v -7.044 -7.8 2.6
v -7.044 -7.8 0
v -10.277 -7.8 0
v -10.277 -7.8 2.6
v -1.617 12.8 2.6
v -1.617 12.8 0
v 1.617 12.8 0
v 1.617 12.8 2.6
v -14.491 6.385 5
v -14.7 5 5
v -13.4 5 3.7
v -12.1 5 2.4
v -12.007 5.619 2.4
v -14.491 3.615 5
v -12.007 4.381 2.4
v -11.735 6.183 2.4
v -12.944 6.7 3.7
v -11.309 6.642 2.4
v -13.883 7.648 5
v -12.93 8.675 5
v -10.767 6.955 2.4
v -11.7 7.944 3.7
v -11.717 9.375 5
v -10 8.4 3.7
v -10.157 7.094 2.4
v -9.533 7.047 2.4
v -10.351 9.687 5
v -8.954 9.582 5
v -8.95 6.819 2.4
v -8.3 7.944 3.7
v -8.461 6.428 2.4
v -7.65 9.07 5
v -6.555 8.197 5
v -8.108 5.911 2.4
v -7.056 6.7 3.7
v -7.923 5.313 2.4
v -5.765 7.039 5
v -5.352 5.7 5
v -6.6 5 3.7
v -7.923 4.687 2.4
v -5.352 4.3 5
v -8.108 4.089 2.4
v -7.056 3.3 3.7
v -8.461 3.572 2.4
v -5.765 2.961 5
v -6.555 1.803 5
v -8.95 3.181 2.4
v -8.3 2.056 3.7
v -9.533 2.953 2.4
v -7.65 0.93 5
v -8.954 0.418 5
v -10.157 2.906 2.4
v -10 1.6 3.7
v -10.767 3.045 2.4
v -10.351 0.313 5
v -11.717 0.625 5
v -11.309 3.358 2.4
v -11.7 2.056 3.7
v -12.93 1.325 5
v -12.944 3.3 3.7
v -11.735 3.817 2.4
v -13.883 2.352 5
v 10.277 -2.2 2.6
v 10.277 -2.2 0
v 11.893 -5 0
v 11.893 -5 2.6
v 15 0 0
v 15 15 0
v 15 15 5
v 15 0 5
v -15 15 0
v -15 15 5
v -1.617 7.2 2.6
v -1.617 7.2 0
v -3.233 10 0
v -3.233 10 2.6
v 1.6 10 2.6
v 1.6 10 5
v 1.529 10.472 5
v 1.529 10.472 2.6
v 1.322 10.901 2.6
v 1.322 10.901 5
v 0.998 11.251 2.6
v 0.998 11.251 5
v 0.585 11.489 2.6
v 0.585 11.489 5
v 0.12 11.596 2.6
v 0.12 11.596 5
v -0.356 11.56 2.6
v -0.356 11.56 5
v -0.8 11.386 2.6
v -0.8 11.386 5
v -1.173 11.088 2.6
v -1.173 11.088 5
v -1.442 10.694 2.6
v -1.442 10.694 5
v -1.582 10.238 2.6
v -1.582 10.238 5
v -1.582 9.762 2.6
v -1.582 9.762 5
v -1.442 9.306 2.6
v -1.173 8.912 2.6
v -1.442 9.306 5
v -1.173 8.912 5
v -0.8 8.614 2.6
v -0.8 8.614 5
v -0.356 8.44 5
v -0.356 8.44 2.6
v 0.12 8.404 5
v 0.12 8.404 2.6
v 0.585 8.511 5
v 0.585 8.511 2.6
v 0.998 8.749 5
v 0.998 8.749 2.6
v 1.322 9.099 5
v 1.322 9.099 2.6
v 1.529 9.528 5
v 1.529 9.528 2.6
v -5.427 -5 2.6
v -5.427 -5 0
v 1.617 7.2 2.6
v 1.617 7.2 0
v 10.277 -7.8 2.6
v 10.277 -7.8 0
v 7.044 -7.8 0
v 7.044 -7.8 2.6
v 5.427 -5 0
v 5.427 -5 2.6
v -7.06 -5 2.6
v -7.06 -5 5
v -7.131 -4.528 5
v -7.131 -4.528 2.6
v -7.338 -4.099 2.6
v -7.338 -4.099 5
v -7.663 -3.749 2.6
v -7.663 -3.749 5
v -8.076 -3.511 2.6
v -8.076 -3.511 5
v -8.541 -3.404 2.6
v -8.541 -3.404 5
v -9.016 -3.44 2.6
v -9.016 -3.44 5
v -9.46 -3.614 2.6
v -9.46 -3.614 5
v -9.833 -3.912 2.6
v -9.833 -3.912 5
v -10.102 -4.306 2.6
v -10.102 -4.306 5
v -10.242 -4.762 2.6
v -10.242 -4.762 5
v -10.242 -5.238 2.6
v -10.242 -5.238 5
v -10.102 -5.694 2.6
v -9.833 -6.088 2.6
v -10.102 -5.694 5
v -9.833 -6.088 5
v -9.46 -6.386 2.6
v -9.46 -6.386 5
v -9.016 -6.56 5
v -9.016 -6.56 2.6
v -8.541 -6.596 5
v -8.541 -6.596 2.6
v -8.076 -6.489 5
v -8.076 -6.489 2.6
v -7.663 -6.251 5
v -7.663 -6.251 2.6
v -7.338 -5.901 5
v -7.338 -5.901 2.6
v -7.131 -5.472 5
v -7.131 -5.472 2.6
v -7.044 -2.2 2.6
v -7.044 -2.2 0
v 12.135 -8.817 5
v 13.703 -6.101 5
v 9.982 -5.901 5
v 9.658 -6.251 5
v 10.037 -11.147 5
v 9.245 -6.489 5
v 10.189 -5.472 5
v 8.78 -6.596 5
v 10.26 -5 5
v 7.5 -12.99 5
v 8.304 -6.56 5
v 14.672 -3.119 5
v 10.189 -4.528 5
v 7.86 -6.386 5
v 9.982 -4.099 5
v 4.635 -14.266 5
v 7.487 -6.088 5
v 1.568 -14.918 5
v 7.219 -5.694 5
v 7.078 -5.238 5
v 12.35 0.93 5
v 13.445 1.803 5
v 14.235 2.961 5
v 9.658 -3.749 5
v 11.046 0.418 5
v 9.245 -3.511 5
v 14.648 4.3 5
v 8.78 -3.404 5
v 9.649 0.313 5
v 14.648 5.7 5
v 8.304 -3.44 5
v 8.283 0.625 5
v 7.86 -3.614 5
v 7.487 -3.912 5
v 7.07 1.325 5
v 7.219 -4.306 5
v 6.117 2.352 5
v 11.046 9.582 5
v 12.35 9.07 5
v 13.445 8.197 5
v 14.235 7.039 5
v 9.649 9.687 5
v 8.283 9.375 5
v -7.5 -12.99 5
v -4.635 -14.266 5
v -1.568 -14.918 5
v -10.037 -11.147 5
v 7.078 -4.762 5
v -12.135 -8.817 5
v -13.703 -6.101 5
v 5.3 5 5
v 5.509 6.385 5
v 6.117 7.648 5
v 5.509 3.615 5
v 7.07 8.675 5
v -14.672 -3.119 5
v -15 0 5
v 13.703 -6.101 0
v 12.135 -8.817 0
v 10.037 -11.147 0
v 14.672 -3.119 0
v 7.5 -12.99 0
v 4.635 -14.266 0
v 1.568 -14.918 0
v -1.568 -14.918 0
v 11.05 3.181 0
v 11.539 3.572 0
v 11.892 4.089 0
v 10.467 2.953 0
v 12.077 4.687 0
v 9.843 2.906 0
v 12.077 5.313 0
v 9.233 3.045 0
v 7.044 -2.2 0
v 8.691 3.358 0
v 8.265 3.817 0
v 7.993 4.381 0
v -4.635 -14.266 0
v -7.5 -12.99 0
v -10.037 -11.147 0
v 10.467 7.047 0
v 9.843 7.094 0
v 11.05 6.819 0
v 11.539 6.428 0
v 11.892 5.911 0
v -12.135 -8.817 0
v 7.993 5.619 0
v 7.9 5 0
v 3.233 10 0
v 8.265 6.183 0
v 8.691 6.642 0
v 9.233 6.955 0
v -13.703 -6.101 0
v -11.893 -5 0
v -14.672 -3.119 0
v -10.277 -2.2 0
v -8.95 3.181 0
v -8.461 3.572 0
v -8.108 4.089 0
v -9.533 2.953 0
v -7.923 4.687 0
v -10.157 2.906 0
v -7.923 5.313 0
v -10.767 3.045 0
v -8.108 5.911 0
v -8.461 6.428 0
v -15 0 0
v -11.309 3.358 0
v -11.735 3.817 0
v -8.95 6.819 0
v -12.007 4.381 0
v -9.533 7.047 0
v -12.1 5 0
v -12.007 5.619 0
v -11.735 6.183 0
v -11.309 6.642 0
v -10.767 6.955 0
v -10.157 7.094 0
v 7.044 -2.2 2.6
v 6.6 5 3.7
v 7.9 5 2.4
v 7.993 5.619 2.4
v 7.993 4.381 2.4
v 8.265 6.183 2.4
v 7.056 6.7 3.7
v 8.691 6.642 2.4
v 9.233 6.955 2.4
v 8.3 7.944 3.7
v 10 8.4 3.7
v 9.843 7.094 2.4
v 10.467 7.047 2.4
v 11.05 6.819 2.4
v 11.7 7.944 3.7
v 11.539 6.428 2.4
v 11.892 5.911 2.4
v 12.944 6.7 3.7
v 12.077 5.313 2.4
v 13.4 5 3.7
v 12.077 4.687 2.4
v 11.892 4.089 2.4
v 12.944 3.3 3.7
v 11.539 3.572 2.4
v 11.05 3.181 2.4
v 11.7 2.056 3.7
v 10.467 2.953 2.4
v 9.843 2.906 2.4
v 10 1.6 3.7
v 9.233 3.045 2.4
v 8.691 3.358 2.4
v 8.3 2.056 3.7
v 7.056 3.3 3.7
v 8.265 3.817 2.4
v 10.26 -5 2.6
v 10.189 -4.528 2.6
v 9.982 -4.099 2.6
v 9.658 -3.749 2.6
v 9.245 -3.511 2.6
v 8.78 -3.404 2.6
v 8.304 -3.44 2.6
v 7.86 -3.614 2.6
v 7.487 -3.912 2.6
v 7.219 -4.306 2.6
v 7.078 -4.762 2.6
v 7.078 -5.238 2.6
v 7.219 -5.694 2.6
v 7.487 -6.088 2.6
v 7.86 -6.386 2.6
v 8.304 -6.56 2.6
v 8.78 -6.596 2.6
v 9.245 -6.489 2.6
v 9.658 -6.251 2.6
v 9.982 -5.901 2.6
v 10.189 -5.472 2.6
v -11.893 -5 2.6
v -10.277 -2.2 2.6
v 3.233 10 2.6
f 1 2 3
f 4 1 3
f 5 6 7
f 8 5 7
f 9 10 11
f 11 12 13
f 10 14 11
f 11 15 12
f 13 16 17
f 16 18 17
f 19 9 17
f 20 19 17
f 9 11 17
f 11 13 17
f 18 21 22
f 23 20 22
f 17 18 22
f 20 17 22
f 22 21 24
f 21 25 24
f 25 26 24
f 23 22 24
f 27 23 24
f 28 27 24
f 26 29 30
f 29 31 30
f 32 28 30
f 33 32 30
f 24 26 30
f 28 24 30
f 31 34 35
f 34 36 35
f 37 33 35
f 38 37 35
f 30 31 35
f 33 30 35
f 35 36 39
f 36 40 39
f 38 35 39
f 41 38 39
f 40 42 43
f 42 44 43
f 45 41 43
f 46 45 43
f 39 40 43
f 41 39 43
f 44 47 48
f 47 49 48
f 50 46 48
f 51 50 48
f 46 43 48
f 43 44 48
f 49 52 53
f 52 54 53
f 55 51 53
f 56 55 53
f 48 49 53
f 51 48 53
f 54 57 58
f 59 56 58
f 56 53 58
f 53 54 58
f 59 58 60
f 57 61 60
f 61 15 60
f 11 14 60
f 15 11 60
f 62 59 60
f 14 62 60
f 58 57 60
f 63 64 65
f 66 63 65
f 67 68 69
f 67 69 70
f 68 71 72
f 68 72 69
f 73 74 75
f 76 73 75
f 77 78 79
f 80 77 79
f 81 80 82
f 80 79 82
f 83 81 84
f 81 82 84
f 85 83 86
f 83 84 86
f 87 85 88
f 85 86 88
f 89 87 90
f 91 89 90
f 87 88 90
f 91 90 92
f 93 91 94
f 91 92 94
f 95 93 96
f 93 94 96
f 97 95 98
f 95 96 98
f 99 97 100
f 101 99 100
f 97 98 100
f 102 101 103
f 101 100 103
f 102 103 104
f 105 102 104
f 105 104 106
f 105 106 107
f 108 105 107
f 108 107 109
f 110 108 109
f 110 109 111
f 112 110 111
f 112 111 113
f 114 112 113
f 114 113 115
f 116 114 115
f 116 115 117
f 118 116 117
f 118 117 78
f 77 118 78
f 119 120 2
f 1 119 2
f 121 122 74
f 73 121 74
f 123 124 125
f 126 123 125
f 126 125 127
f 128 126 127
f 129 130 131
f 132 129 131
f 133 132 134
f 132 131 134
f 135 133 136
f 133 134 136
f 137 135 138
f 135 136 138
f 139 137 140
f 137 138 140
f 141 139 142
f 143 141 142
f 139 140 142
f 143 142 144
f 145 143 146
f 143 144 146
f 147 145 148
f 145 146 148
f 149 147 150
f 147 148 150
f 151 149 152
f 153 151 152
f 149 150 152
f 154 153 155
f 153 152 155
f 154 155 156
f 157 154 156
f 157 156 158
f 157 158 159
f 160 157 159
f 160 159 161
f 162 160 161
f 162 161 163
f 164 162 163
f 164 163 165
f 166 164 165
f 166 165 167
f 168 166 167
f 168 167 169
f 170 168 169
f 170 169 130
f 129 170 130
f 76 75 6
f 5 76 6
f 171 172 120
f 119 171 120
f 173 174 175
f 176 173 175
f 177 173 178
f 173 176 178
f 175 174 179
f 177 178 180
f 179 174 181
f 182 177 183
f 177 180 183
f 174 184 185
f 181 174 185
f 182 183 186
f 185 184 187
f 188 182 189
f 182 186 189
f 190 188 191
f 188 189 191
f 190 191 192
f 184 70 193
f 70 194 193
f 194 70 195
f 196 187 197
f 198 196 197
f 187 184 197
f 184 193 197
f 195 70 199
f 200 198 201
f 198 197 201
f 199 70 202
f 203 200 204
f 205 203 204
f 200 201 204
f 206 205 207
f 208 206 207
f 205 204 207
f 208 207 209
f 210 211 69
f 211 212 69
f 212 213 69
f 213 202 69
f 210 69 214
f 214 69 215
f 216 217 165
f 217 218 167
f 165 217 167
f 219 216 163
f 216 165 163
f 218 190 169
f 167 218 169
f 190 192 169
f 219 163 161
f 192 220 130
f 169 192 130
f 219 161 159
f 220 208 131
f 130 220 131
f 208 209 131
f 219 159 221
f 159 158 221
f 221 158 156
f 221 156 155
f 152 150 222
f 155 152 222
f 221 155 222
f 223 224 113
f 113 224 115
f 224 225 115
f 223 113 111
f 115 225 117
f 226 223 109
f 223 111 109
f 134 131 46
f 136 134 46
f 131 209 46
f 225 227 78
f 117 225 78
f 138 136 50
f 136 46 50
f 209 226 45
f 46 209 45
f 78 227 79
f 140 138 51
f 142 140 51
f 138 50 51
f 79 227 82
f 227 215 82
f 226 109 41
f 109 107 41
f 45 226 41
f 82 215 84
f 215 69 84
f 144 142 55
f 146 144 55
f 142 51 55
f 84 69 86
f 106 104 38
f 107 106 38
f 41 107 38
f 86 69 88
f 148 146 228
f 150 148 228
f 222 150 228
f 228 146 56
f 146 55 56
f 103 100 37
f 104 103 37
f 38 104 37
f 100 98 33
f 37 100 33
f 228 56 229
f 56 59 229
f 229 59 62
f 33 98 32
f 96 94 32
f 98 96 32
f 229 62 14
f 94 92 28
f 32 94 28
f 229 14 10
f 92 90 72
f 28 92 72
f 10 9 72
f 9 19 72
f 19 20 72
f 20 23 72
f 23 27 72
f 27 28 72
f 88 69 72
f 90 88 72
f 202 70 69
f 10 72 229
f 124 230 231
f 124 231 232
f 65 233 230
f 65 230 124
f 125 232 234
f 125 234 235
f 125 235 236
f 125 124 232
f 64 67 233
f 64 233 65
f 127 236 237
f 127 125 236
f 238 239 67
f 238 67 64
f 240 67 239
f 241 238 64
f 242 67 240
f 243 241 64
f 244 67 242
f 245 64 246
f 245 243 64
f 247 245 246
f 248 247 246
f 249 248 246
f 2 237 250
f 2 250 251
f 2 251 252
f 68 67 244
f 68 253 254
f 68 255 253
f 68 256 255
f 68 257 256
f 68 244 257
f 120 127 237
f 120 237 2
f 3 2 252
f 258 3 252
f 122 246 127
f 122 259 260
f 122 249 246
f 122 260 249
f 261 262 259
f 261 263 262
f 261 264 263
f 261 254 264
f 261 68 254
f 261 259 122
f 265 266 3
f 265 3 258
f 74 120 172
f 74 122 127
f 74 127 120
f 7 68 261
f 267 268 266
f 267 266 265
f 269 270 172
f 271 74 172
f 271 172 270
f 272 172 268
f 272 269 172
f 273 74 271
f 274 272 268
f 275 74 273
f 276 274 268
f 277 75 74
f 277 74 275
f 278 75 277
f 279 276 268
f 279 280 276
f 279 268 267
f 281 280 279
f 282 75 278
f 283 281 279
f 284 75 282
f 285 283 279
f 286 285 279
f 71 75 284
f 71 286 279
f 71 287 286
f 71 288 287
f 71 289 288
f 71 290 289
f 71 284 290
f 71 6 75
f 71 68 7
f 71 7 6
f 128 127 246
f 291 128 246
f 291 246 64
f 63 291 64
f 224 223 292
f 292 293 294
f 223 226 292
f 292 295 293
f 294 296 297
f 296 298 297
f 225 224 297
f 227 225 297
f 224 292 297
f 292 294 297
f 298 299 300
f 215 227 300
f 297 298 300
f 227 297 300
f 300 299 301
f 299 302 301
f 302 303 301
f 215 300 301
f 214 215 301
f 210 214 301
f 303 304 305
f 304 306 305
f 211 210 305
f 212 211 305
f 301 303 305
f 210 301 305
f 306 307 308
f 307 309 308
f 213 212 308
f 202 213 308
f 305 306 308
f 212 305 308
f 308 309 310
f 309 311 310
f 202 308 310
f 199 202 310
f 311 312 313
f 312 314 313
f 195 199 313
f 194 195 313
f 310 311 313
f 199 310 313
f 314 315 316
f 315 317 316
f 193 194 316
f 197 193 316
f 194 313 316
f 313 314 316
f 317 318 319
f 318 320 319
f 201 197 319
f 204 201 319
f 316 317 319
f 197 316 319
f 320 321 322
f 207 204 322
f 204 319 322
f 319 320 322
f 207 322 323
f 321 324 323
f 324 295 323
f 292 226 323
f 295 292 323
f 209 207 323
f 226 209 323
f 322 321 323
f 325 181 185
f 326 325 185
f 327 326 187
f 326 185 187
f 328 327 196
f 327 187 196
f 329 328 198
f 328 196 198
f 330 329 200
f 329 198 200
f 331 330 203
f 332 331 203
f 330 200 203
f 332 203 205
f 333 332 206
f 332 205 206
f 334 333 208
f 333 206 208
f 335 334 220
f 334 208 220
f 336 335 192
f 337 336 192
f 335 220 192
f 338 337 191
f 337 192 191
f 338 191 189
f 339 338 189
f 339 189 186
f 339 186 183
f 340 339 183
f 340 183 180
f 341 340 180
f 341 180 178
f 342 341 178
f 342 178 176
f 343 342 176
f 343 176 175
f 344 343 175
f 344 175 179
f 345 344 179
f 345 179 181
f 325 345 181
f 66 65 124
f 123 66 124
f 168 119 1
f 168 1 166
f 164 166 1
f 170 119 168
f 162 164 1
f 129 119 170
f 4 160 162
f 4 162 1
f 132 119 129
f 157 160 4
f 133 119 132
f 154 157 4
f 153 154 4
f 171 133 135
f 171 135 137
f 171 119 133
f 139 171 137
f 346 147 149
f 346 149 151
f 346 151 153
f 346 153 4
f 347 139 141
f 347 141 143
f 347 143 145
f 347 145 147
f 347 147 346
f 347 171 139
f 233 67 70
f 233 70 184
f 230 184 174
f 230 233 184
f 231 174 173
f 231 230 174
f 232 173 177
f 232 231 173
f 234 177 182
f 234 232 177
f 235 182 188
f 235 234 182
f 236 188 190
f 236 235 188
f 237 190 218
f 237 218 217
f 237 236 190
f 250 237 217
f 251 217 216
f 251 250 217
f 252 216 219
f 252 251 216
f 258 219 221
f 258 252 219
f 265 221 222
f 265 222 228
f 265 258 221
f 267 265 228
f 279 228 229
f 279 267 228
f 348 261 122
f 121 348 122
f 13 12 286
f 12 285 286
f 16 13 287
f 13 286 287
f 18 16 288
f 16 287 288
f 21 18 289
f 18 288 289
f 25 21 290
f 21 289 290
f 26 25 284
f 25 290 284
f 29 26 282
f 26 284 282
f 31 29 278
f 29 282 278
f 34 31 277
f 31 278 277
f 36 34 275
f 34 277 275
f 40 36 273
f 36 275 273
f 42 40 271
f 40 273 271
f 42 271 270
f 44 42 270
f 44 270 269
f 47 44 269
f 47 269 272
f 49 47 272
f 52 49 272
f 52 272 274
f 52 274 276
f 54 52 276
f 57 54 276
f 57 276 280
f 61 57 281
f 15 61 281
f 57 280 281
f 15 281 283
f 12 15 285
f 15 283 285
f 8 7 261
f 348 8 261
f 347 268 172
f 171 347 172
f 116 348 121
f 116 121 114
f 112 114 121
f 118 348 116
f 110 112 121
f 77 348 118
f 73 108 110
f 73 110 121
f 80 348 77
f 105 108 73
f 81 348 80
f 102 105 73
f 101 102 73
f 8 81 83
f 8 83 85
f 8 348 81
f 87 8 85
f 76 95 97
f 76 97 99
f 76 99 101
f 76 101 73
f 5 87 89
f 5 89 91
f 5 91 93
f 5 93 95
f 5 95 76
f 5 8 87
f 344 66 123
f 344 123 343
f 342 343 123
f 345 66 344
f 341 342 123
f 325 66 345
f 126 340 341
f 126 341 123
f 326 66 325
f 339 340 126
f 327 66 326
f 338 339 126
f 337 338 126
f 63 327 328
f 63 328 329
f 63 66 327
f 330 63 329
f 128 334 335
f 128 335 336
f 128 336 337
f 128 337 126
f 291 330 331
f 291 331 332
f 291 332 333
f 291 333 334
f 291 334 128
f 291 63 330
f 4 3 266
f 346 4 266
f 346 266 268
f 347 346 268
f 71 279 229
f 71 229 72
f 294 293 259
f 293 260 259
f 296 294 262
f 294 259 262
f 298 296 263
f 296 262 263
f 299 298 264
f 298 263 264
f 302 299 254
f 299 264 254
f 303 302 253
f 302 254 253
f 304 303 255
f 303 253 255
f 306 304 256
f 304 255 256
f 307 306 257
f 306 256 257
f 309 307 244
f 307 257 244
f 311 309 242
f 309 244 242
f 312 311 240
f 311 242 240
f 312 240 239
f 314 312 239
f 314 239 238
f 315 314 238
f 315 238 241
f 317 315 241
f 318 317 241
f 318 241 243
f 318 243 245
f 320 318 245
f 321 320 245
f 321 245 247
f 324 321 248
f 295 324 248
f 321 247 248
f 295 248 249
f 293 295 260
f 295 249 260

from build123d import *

# Parameters (mm, degrees)
EXTRUDE_1_DEPTH             = 5
SKETCH_2_R                  = 1.6
CUT_EXTRUDE_1_DEPTH         = 22.794494718
HOLE_WIZARD_M41_D           = 4.2
HOLE_WIZARD_M41_DEPTH       = 8.5
HOLE_WIZARD_M41_CSINK_D     = 9.4
HOLE_WIZARD_M41_CSINK_ANGLE = 90
HOLE_WIZARD_M41_TIP         = 1.2618073
CUT_EXTRUDE_2_DEPTH         = 2.6


with BuildPart() as part:
    # Эскиз1 → Бобышка-Вытянуть1 (new body)
    with BuildSketch(Plane.XY):
        with BuildLine():
            Line((-15, 15), (15, 15))
            Line((15, 15), (15, 0))
            ThreePointArc((15, 0), (0, -15), (-15, 0))
            Line((-15, 0), (-15, 15))
        make_face()
    extrude(amount=EXTRUDE_1_DEPTH)

    # Эскиз2 → Вырез-Вытянуть1 (cut, through all)
    with BuildSketch(Plane.XY.offset(5)):
        with Locations((0, 10)):
            Circle(SKETCH_2_R)
        with Locations((8.660254038, -5)):
            Circle(SKETCH_2_R)
        with Locations((-8.660254038, -5)):
            Circle(SKETCH_2_R)
    extrude(amount=-CUT_EXTRUDE_1_DEPTH, mode=Mode.SUBTRACT)

    # Зенковка для винта с полупотайной головкой M41
    with Locations(Plane(origin=(-10, 5, 5), x_dir=(1, 0, 0), z_dir=(0, 0, 1))):
        with Locations((0, 0), (20, 0)):
            CounterSinkHole(HOLE_WIZARD_M41_D / 2, HOLE_WIZARD_M41_CSINK_D / 2, depth=HOLE_WIZARD_M41_DEPTH, counter_sink_angle=HOLE_WIZARD_M41_CSINK_ANGLE)
            with Locations((0, 0, -(HOLE_WIZARD_M41_DEPTH + HOLE_WIZARD_M41_TIP / 2))):  # 118° drill point
                Cone(0, HOLE_WIZARD_M41_D / 2, HOLE_WIZARD_M41_TIP, mode=Mode.SUBTRACT)

    # Эскиз4 → Вырез-Вытянуть2 (cut)
    with BuildSketch(Plane(origin=(0, 0, 0), x_dir=(-1, 0, 0), z_dir=(0, 0, -1))):
        Polygon((3.233161507, 10), (1.616580754, 12.8), (-1.616580754, 12.8), (-3.233161507, 10), (-1.616580754, 7.2), (1.616580754, 7.2), align=None)
        Polygon((11.893415545, -5), (10.276834792, -2.2), (7.043673284, -2.2), (5.42709253, -5), (7.043673284, -7.8), (10.276834792, -7.8), align=None)
        Polygon((-5.42709253, -5), (-7.043673284, -2.2), (-10.276834792, -2.2), (-11.893415545, -5), (-10.276834792, -7.8), (-7.043673284, -7.8), align=None)
    extrude(amount=-CUT_EXTRUDE_2_DEPTH, mode=Mode.SUBTRACT)


solid = part.part
